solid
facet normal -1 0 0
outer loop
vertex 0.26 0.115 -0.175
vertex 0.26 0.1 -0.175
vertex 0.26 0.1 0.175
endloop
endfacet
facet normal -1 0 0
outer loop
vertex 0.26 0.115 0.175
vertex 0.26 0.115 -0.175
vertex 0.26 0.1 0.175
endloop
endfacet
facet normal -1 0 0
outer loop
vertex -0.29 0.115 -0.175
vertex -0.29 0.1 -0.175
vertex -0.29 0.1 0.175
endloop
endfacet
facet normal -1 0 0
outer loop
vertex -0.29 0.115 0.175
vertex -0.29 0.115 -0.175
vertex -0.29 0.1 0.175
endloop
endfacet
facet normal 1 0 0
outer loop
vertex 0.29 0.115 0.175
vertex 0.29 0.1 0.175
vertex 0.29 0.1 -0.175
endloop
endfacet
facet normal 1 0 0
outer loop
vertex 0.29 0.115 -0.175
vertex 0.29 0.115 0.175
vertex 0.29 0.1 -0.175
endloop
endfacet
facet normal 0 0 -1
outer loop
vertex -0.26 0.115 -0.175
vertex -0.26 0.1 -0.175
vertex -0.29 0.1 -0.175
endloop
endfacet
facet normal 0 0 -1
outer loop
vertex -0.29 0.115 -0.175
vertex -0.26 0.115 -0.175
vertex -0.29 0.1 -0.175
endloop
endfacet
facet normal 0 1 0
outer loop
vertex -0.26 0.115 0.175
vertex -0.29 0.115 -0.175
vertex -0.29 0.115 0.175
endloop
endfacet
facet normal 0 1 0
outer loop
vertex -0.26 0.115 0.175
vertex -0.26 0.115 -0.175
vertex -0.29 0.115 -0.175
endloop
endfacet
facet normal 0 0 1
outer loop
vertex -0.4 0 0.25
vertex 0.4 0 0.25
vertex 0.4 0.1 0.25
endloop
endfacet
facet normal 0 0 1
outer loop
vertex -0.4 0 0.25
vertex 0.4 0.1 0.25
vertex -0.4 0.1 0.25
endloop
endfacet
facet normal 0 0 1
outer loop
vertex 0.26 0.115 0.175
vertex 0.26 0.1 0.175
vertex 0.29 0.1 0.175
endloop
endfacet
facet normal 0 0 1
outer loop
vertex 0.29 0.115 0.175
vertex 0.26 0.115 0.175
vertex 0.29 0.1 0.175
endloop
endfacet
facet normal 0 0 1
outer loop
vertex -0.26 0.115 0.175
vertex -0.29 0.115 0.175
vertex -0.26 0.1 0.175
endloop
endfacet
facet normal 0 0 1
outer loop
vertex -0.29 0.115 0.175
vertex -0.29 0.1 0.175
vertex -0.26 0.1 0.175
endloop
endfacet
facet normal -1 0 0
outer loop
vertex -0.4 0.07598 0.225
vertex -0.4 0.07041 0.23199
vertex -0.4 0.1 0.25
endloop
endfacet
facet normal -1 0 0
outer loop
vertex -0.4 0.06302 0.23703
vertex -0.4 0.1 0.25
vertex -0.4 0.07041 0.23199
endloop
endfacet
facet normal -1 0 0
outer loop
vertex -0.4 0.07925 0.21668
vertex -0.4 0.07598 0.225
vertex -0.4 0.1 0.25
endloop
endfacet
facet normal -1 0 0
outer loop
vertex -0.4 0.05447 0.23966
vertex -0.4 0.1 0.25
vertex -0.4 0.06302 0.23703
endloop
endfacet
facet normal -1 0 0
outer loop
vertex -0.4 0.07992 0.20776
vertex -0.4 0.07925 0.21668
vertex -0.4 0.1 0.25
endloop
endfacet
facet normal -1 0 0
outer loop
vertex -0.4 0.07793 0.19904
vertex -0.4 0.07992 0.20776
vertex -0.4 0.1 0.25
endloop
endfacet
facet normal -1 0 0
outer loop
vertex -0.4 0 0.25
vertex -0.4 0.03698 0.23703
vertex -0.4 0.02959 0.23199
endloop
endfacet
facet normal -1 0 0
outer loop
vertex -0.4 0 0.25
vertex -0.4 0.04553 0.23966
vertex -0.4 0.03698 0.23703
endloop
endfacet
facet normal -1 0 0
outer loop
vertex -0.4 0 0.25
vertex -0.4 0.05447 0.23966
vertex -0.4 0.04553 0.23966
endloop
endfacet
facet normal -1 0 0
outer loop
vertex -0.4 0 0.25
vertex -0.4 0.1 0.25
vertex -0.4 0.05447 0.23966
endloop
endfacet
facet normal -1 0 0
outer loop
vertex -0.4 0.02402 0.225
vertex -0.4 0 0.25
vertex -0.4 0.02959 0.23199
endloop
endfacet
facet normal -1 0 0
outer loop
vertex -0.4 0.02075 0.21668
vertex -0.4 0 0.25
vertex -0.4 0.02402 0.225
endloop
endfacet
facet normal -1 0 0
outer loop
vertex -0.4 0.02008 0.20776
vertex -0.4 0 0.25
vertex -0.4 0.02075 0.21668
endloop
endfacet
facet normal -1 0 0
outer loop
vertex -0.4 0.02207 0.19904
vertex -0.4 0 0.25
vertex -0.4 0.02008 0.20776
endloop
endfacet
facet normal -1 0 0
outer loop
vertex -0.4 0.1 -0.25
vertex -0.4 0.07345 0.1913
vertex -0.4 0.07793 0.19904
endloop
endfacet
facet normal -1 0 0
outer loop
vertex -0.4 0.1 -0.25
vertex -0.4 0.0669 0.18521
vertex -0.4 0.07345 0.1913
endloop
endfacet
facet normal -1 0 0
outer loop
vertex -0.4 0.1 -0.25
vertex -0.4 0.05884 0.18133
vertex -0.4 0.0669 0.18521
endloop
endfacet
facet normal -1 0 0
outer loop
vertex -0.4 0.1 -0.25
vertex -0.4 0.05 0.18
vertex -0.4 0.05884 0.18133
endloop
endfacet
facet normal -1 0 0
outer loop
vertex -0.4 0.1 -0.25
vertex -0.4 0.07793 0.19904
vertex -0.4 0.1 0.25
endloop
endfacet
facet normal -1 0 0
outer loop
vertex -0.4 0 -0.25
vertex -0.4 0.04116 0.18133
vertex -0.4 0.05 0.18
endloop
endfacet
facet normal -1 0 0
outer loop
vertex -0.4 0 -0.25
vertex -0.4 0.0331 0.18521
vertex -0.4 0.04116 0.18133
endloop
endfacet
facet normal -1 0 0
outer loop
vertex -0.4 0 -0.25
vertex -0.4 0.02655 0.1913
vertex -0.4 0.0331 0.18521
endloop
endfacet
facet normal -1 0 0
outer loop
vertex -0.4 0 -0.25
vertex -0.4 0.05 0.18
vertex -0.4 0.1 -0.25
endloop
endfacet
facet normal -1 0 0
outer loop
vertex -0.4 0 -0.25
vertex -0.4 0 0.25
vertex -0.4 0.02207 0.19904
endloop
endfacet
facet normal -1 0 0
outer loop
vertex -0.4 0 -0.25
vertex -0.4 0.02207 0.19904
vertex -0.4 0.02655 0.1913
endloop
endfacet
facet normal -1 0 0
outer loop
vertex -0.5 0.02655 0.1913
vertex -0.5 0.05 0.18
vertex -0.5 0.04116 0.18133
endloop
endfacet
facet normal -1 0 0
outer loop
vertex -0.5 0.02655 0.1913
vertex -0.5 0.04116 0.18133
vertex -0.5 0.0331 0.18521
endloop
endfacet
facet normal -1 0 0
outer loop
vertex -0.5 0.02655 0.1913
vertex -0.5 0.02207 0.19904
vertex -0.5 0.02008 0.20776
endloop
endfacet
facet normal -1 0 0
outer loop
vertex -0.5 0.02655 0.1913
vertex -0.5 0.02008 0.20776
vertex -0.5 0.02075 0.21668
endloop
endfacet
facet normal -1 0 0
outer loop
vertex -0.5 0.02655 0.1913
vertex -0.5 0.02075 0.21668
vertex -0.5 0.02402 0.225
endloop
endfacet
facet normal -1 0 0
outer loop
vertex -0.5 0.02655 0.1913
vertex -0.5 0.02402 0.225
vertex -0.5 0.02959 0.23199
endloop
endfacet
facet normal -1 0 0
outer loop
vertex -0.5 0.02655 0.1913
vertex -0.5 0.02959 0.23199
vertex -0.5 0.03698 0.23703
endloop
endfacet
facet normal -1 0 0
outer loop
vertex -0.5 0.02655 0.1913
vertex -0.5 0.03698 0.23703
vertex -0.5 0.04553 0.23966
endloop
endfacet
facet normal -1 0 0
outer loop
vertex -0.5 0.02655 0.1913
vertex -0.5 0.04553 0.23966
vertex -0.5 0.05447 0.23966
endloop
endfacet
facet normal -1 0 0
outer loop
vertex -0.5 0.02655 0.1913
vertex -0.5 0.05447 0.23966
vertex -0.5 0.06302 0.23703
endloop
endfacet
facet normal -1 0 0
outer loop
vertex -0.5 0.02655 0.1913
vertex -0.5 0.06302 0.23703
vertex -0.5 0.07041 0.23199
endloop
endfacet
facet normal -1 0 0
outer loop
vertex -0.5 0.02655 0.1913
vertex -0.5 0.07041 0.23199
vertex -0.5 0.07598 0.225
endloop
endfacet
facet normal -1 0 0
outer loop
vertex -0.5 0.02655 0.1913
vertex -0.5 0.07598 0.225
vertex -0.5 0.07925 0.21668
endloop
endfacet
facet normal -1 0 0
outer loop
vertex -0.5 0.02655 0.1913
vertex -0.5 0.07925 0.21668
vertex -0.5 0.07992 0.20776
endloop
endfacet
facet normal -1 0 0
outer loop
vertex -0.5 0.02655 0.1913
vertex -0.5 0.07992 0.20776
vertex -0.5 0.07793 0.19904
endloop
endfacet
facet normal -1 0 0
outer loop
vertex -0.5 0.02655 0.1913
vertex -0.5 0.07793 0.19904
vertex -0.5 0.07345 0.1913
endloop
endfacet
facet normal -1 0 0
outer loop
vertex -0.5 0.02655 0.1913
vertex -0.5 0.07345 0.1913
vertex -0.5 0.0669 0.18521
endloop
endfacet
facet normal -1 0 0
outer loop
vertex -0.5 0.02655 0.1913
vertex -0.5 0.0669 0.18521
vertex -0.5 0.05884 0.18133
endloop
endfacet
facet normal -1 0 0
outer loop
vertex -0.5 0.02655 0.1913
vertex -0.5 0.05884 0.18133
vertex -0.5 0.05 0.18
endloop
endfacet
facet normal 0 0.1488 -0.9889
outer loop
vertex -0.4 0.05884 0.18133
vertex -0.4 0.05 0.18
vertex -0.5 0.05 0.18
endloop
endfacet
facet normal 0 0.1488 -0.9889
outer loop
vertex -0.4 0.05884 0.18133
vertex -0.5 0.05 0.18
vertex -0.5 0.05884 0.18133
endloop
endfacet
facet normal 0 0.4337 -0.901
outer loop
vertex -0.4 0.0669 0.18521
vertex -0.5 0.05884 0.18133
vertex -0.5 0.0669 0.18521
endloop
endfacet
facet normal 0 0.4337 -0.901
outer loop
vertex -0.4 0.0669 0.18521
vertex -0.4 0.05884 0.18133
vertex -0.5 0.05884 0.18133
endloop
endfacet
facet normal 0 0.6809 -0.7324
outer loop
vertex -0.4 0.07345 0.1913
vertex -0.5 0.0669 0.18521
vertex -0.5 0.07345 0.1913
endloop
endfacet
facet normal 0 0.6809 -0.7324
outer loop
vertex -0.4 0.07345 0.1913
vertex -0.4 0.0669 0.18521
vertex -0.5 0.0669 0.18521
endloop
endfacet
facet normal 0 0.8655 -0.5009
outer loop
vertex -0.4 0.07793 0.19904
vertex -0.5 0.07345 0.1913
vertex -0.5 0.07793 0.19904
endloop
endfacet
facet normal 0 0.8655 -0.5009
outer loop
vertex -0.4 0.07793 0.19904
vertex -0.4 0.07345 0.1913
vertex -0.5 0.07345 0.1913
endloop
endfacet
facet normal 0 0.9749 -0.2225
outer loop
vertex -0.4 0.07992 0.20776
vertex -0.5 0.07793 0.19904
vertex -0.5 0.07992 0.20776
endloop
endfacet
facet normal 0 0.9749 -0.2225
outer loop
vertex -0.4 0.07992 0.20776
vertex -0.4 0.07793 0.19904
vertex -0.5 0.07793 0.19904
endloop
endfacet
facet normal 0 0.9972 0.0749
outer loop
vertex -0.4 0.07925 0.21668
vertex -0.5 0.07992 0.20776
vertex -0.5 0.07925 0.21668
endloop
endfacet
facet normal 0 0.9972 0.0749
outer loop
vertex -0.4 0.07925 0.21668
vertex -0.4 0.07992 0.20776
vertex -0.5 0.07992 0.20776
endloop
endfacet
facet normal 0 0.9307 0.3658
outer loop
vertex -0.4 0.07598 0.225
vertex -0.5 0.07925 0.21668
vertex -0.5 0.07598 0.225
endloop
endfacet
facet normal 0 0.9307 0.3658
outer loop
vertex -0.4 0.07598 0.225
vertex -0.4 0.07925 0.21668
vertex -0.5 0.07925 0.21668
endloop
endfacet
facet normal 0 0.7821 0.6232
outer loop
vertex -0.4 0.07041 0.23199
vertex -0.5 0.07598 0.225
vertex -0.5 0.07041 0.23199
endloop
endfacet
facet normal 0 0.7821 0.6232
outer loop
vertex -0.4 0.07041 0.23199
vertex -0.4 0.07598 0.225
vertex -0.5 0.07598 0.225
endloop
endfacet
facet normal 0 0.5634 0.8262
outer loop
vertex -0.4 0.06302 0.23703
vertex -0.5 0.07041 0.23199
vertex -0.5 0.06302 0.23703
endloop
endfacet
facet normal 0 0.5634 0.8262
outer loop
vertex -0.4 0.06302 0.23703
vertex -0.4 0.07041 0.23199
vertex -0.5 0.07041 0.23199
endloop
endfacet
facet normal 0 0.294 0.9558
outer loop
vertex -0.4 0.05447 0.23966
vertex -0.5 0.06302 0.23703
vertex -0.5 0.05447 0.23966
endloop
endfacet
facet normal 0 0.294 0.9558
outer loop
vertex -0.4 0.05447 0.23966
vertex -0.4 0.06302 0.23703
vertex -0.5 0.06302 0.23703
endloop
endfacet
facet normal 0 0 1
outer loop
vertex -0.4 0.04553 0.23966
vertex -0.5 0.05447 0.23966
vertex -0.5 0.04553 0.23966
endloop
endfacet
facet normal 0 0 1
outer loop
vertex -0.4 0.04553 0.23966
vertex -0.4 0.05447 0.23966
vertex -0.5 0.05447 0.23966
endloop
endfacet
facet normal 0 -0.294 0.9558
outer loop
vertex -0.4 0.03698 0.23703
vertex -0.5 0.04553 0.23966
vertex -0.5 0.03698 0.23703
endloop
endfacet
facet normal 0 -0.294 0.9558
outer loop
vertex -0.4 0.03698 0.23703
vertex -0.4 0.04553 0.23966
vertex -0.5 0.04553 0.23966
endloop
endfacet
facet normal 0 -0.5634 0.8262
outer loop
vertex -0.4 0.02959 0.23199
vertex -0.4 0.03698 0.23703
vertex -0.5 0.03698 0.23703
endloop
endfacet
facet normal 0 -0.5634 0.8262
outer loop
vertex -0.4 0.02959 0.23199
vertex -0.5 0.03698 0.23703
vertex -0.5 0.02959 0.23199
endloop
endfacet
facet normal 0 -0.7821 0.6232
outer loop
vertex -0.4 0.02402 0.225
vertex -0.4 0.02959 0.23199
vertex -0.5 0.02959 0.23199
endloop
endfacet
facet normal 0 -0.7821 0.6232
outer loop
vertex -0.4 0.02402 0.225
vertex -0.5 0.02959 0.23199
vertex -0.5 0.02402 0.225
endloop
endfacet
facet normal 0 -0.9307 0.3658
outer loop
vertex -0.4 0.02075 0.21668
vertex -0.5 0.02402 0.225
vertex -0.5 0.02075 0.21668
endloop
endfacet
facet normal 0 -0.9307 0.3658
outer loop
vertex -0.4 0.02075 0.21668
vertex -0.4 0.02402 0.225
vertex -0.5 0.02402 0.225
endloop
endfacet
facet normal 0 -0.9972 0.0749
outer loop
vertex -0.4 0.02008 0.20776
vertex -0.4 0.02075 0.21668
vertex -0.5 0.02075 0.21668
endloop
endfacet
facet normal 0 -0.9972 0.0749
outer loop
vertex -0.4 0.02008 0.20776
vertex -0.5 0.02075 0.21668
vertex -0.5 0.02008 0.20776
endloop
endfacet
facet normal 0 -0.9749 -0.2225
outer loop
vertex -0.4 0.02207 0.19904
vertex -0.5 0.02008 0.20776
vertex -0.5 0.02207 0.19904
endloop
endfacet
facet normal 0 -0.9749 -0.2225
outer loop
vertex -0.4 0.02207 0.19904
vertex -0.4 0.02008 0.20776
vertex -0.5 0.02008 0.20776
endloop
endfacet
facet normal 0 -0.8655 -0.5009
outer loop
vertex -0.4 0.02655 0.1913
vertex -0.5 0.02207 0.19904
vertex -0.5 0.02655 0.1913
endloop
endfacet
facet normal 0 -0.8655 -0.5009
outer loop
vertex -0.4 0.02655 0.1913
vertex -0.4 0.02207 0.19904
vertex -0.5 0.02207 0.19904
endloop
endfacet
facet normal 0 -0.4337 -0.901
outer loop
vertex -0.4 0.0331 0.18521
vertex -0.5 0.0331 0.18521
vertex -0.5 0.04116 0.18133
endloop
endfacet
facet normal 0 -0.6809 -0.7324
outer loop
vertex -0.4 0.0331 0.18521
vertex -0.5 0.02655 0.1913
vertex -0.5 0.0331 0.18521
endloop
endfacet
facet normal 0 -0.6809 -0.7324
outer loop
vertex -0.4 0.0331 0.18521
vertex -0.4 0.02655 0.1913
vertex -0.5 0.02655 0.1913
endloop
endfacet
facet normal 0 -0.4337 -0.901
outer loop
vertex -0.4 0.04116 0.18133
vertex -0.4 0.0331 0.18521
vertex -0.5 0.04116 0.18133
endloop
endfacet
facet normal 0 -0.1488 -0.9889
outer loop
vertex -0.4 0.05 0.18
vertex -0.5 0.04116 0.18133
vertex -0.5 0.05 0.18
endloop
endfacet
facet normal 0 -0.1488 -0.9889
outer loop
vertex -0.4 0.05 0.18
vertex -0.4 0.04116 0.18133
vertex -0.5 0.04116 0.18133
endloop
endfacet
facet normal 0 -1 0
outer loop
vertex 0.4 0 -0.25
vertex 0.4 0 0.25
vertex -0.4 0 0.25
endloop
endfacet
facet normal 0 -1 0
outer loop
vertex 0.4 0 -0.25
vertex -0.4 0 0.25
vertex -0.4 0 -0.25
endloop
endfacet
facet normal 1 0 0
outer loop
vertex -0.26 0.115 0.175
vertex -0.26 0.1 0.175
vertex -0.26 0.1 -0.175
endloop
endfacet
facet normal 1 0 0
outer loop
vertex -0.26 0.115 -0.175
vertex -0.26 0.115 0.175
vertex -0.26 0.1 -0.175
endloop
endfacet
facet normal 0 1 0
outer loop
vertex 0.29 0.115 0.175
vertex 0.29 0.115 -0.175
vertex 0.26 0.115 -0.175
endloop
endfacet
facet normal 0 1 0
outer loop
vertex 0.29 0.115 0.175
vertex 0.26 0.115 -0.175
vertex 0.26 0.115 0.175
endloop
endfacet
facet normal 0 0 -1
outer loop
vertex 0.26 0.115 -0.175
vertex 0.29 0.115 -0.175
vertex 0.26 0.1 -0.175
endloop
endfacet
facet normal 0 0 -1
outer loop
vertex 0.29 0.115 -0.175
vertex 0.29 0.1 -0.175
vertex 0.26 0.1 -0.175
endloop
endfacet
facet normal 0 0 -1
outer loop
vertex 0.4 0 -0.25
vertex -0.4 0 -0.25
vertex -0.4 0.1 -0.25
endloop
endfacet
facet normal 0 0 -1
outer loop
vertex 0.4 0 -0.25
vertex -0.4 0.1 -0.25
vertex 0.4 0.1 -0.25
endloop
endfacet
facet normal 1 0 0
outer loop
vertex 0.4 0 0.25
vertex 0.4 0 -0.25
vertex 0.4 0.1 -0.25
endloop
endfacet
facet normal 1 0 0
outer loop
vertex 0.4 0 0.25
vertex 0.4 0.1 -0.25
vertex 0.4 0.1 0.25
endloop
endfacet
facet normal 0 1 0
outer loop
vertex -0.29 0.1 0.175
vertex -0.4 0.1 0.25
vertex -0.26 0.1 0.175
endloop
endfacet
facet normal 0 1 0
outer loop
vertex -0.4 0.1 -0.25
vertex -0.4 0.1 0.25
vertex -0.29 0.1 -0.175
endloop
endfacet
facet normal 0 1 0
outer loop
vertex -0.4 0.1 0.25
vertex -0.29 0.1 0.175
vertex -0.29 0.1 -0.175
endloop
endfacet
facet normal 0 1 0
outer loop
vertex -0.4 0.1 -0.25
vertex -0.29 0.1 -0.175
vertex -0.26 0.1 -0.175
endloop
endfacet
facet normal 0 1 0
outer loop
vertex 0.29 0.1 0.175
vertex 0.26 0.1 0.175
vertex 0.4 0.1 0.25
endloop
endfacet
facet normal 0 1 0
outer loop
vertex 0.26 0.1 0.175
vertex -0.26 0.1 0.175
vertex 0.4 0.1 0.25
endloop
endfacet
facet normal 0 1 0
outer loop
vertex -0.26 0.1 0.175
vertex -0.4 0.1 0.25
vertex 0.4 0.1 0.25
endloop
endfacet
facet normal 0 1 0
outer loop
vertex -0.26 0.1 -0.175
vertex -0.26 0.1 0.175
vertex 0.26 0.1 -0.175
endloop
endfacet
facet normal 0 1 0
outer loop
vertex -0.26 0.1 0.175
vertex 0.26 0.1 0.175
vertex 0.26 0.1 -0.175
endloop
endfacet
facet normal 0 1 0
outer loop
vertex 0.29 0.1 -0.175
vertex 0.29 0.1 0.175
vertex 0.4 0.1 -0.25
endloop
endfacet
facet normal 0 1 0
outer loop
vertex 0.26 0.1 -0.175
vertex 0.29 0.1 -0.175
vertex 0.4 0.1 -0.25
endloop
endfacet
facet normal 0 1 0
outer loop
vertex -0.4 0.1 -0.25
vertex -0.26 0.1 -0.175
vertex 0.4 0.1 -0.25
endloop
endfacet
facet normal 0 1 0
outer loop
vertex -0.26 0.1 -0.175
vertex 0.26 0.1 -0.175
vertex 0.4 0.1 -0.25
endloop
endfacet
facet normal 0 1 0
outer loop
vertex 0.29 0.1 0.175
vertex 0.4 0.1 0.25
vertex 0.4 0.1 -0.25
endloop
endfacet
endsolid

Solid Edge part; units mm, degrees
sketch "Sketch1" plane through (0, 0, 0) normal (0, -1, 0) x (1, 0, 0)
  line L0 (-0.4, -0.25) -> (0.4, -0.25)
  line L1 (0.4, -0.25) -> (0.4, 0.25)
  line L2 (0.4, 0.25) -> (-0.4, 0.25)
  line L3 (-0.4, 0.25) -> (-0.4, -0.25)
  dimension "D1" = 0.8
  dimension "D2" = 0.5
extrude "Protrusion1" add sketch "Sketch1" against normal blind 0.1
sketch "Sketch2" plane through (-0.4, 0.05, 0) normal (-1, 0, 0) x (0, 0, -1)
  circle A0 centre (-0.21, 0) radius 0.03
  dimension "D1" = 0.05
  dimension "D2" = 0.04
  dimension "D3" = 0.06
extrude "Ausprägung_2" add sketch "Sketch2" along normal blind 0.1
sketch "Sketch3" plane through (0, 0.1, 0) normal (0, 1, 0) x (1, 0, 0)
  line L0 (0.26, -0.175) -> (0.29, -0.175)
  line L1 (0.29, -0.175) -> (0.29, 0.175)
  line L2 (0.29, 0.175) -> (0.26, 0.175)
  line L3 (0.26, 0.175) -> (0.26, -0.175)
  line L4 (-0.29, -0.175) -> (-0.26, -0.175)
  line L5 (-0.26, -0.175) -> (-0.26, 0.175)
  line L6 (-0.26, 0.175) -> (-0.29, 0.175)
  line L7 (-0.29, 0.175) -> (-0.29, -0.175)
  dimension "D1" = 0.55
  dimension "D2" = 0.03
  dimension "D3" = 0.35
extrude "Ausprägung_3" add sketch "Sketch3" along normal blind 0.015
